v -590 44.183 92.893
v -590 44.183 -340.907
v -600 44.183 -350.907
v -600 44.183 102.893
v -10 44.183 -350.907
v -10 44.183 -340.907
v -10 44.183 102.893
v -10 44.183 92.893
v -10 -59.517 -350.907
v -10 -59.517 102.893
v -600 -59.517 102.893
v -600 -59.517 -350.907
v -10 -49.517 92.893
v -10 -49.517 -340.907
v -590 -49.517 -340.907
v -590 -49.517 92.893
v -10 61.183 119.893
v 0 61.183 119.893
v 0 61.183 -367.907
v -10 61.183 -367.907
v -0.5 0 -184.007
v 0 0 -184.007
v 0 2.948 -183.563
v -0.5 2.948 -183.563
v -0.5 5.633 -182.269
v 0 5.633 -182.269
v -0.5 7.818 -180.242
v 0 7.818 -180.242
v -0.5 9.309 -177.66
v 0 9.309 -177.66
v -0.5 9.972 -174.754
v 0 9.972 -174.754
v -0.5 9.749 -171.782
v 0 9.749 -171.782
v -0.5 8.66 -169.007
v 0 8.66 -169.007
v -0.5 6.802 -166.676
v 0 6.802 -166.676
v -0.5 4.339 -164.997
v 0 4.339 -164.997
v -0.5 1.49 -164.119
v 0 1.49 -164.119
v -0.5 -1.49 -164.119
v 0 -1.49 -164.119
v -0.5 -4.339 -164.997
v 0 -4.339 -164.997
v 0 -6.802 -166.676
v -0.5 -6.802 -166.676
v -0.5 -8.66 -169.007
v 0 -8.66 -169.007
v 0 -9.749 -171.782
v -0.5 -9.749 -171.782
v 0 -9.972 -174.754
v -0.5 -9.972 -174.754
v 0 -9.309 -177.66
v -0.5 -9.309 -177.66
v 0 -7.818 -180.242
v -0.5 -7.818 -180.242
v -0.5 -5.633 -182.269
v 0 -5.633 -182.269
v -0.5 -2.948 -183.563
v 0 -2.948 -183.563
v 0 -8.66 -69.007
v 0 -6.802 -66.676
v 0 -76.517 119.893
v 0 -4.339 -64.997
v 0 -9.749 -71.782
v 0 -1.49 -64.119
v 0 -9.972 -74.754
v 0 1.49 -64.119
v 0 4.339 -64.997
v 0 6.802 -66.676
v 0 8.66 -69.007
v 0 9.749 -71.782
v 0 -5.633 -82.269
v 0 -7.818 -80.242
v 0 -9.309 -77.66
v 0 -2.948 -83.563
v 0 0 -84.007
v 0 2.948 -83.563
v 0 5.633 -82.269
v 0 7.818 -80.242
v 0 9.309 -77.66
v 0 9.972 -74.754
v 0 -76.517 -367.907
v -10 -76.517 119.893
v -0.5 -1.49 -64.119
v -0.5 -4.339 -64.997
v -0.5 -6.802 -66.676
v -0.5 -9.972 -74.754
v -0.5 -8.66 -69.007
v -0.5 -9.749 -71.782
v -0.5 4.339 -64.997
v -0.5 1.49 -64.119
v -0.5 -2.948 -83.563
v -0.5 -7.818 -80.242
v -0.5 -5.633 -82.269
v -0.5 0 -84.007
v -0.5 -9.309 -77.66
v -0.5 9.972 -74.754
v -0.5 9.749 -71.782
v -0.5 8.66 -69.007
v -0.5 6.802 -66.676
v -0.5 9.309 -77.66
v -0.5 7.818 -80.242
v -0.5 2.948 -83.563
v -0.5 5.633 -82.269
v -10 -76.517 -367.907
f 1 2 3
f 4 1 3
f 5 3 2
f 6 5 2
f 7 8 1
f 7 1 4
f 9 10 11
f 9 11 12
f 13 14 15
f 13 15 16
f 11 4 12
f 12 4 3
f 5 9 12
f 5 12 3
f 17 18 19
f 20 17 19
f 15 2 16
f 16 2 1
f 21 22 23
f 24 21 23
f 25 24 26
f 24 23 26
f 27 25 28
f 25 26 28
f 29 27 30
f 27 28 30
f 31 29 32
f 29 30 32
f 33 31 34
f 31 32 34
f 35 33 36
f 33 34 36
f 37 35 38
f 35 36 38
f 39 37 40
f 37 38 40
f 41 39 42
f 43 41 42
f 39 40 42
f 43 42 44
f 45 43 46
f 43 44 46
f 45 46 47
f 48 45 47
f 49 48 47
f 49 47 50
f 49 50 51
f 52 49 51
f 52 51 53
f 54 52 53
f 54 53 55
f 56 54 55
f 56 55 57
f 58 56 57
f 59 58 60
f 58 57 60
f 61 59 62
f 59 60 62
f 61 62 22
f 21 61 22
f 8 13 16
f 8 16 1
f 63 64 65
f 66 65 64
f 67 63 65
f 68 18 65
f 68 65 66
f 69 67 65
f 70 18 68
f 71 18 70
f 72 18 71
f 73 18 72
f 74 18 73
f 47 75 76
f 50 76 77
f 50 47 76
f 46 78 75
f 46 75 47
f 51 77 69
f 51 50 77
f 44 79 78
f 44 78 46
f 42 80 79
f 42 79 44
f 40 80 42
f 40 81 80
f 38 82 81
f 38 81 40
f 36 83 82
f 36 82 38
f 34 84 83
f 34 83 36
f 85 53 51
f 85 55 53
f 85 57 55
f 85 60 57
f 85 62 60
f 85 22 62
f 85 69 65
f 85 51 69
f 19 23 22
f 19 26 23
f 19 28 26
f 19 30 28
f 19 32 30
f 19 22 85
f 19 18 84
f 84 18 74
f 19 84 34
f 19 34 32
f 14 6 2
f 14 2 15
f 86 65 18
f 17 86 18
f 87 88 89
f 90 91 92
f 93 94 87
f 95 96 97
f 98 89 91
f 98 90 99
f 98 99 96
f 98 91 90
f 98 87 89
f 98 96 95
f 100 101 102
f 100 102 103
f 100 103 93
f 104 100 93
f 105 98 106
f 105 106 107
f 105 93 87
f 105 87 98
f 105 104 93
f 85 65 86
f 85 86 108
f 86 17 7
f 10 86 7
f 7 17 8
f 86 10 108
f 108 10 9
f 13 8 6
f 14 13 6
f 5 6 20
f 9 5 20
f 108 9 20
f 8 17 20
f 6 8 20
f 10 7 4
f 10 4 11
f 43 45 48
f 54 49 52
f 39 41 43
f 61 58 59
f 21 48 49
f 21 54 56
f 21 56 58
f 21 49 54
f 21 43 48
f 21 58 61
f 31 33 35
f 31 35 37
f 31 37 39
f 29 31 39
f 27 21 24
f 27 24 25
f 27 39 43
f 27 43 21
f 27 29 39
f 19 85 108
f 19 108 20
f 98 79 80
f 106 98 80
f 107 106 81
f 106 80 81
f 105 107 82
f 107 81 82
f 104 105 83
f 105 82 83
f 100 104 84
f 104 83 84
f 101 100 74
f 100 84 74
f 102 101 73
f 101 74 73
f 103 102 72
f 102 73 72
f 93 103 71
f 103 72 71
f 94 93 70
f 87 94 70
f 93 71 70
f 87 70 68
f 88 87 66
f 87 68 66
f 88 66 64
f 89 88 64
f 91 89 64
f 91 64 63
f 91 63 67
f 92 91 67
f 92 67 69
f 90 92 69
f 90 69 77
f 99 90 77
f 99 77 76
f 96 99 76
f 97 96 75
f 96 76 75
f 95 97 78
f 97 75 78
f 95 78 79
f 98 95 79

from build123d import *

# Parameters (mm, degrees)
SKETCH1_W           = 487.8
SKETCH1_H           = 137.7
SKETCH1_W_2         = 453.8
SKETCH1_H_2         = 103.7
BOSS_EXTRUDE2_DEPTH = 10
BOSS_EXTRUDE3_DEPTH = 600
SKETCH5_W           = 433.8
SKETCH5_H           = 93.7
BOSS_EXTRUDE4_DEPTH = 10
SKETCH6_W           = 453.8
SKETCH6_H           = 103.7
BOSS_EXTRUDE5_DEPTH = 10
SKETCH7_R           = 25
CUT_EXTRUDE2_DEPTH  = 5
SKETCH8_W           = 116.599055382
SKETCH8_H           = 75.38732029
BOSS_EXTRUDE6_DEPTH = 9
SKETCH9_R           = 10
CUT_EXTRUDE4_DEPTH  = 0.5


with BuildPart() as part:
    # Sketch1 → Boss-Extrude2 (new body)
    with BuildSketch(Plane(origin=(0, 0, 0), x_dir=(0, 0, -1), z_dir=(1, 0, 0))):
        with Locations((124.007003891, -7.666536965)):
            Rectangle(SKETCH1_W, SKETCH1_H)
        with Locations((124.007003891, -7.666536965)):
            Rectangle(SKETCH1_W_2, SKETCH1_H_2, mode=Mode.SUBTRACT)
    extrude(amount=-BOSS_EXTRUDE2_DEPTH)

    # Sketch4 → Boss-Extrude3 (add)
    with BuildSketch(Plane(origin=(0, 0, 0), x_dir=(0, 0, -1), z_dir=(1, 0, 0))):
        Polygon((-92.892996109, -49.516536965), (-92.892996109, 34.183463035), (-92.892996109, 44.183463035), (-102.892996109, 44.183463035), (-102.892996109, -59.516536965), (350.907003891, -59.516536965), (350.907003891, 44.183463035), (340.907003891, 44.183463035), (340.907003891, 34.183463035), (340.907003891, -49.516536965), align=None)
    extrude(amount=-BOSS_EXTRUDE3_DEPTH)

    # Sketch5 → Boss-Extrude4 (add)
    with BuildSketch(Plane(origin=(0, 0, 0), x_dir=(0, 0, -1), z_dir=(1, 0, 0))):
        with Locations((124.007003891, -2.666536965)):
            Rectangle(SKETCH5_W, SKETCH5_H)
    extrude(amount=-BOSS_EXTRUDE4_DEPTH)

    # Sketch6 → Boss-Extrude5 (add)
    with BuildSketch(Plane.ZY.offset(600)):
        with Locations((-124.007003891, -7.666536965)):
            Rectangle(SKETCH6_W, SKETCH6_H)
    extrude(amount=-BOSS_EXTRUDE5_DEPTH)

    # Sketch7 → Cut-Extrude2 (cut)
    with BuildSketch(Plane(origin=(0, 0, 0), x_dir=(0, 0, -1), z_dir=(1, 0, 0))):
        with Locations((124.007003891, -11.609012226)):
            Circle(SKETCH7_R)
    extrude(amount=-CUT_EXTRUDE2_DEPTH, mode=Mode.SUBTRACT)

    # Sketch8 → Boss-Extrude6 (add)
    with BuildSketch(Plane(origin=(0, 0, 0), x_dir=(0, 0, -1), z_dir=(1, 0, 0))):
        with Locations((135.566393002, -11.938485115)):
            Rectangle(SKETCH8_W, SKETCH8_H)
    extrude(amount=-BOSS_EXTRUDE6_DEPTH)

    # Sketch9 → Cut-Extrude4 (cut)
    with BuildSketch(Plane(origin=(0, 0, 0), x_dir=(0, 0, -1), z_dir=(1, 0, 0))):
        with Locations((74.007003891, 0)):
            Circle(SKETCH9_R)
        with Locations((174.007003891, 0)):
            Circle(SKETCH9_R)
    extrude(amount=-CUT_EXTRUDE4_DEPTH, mode=Mode.SUBTRACT)


solid = part.part
